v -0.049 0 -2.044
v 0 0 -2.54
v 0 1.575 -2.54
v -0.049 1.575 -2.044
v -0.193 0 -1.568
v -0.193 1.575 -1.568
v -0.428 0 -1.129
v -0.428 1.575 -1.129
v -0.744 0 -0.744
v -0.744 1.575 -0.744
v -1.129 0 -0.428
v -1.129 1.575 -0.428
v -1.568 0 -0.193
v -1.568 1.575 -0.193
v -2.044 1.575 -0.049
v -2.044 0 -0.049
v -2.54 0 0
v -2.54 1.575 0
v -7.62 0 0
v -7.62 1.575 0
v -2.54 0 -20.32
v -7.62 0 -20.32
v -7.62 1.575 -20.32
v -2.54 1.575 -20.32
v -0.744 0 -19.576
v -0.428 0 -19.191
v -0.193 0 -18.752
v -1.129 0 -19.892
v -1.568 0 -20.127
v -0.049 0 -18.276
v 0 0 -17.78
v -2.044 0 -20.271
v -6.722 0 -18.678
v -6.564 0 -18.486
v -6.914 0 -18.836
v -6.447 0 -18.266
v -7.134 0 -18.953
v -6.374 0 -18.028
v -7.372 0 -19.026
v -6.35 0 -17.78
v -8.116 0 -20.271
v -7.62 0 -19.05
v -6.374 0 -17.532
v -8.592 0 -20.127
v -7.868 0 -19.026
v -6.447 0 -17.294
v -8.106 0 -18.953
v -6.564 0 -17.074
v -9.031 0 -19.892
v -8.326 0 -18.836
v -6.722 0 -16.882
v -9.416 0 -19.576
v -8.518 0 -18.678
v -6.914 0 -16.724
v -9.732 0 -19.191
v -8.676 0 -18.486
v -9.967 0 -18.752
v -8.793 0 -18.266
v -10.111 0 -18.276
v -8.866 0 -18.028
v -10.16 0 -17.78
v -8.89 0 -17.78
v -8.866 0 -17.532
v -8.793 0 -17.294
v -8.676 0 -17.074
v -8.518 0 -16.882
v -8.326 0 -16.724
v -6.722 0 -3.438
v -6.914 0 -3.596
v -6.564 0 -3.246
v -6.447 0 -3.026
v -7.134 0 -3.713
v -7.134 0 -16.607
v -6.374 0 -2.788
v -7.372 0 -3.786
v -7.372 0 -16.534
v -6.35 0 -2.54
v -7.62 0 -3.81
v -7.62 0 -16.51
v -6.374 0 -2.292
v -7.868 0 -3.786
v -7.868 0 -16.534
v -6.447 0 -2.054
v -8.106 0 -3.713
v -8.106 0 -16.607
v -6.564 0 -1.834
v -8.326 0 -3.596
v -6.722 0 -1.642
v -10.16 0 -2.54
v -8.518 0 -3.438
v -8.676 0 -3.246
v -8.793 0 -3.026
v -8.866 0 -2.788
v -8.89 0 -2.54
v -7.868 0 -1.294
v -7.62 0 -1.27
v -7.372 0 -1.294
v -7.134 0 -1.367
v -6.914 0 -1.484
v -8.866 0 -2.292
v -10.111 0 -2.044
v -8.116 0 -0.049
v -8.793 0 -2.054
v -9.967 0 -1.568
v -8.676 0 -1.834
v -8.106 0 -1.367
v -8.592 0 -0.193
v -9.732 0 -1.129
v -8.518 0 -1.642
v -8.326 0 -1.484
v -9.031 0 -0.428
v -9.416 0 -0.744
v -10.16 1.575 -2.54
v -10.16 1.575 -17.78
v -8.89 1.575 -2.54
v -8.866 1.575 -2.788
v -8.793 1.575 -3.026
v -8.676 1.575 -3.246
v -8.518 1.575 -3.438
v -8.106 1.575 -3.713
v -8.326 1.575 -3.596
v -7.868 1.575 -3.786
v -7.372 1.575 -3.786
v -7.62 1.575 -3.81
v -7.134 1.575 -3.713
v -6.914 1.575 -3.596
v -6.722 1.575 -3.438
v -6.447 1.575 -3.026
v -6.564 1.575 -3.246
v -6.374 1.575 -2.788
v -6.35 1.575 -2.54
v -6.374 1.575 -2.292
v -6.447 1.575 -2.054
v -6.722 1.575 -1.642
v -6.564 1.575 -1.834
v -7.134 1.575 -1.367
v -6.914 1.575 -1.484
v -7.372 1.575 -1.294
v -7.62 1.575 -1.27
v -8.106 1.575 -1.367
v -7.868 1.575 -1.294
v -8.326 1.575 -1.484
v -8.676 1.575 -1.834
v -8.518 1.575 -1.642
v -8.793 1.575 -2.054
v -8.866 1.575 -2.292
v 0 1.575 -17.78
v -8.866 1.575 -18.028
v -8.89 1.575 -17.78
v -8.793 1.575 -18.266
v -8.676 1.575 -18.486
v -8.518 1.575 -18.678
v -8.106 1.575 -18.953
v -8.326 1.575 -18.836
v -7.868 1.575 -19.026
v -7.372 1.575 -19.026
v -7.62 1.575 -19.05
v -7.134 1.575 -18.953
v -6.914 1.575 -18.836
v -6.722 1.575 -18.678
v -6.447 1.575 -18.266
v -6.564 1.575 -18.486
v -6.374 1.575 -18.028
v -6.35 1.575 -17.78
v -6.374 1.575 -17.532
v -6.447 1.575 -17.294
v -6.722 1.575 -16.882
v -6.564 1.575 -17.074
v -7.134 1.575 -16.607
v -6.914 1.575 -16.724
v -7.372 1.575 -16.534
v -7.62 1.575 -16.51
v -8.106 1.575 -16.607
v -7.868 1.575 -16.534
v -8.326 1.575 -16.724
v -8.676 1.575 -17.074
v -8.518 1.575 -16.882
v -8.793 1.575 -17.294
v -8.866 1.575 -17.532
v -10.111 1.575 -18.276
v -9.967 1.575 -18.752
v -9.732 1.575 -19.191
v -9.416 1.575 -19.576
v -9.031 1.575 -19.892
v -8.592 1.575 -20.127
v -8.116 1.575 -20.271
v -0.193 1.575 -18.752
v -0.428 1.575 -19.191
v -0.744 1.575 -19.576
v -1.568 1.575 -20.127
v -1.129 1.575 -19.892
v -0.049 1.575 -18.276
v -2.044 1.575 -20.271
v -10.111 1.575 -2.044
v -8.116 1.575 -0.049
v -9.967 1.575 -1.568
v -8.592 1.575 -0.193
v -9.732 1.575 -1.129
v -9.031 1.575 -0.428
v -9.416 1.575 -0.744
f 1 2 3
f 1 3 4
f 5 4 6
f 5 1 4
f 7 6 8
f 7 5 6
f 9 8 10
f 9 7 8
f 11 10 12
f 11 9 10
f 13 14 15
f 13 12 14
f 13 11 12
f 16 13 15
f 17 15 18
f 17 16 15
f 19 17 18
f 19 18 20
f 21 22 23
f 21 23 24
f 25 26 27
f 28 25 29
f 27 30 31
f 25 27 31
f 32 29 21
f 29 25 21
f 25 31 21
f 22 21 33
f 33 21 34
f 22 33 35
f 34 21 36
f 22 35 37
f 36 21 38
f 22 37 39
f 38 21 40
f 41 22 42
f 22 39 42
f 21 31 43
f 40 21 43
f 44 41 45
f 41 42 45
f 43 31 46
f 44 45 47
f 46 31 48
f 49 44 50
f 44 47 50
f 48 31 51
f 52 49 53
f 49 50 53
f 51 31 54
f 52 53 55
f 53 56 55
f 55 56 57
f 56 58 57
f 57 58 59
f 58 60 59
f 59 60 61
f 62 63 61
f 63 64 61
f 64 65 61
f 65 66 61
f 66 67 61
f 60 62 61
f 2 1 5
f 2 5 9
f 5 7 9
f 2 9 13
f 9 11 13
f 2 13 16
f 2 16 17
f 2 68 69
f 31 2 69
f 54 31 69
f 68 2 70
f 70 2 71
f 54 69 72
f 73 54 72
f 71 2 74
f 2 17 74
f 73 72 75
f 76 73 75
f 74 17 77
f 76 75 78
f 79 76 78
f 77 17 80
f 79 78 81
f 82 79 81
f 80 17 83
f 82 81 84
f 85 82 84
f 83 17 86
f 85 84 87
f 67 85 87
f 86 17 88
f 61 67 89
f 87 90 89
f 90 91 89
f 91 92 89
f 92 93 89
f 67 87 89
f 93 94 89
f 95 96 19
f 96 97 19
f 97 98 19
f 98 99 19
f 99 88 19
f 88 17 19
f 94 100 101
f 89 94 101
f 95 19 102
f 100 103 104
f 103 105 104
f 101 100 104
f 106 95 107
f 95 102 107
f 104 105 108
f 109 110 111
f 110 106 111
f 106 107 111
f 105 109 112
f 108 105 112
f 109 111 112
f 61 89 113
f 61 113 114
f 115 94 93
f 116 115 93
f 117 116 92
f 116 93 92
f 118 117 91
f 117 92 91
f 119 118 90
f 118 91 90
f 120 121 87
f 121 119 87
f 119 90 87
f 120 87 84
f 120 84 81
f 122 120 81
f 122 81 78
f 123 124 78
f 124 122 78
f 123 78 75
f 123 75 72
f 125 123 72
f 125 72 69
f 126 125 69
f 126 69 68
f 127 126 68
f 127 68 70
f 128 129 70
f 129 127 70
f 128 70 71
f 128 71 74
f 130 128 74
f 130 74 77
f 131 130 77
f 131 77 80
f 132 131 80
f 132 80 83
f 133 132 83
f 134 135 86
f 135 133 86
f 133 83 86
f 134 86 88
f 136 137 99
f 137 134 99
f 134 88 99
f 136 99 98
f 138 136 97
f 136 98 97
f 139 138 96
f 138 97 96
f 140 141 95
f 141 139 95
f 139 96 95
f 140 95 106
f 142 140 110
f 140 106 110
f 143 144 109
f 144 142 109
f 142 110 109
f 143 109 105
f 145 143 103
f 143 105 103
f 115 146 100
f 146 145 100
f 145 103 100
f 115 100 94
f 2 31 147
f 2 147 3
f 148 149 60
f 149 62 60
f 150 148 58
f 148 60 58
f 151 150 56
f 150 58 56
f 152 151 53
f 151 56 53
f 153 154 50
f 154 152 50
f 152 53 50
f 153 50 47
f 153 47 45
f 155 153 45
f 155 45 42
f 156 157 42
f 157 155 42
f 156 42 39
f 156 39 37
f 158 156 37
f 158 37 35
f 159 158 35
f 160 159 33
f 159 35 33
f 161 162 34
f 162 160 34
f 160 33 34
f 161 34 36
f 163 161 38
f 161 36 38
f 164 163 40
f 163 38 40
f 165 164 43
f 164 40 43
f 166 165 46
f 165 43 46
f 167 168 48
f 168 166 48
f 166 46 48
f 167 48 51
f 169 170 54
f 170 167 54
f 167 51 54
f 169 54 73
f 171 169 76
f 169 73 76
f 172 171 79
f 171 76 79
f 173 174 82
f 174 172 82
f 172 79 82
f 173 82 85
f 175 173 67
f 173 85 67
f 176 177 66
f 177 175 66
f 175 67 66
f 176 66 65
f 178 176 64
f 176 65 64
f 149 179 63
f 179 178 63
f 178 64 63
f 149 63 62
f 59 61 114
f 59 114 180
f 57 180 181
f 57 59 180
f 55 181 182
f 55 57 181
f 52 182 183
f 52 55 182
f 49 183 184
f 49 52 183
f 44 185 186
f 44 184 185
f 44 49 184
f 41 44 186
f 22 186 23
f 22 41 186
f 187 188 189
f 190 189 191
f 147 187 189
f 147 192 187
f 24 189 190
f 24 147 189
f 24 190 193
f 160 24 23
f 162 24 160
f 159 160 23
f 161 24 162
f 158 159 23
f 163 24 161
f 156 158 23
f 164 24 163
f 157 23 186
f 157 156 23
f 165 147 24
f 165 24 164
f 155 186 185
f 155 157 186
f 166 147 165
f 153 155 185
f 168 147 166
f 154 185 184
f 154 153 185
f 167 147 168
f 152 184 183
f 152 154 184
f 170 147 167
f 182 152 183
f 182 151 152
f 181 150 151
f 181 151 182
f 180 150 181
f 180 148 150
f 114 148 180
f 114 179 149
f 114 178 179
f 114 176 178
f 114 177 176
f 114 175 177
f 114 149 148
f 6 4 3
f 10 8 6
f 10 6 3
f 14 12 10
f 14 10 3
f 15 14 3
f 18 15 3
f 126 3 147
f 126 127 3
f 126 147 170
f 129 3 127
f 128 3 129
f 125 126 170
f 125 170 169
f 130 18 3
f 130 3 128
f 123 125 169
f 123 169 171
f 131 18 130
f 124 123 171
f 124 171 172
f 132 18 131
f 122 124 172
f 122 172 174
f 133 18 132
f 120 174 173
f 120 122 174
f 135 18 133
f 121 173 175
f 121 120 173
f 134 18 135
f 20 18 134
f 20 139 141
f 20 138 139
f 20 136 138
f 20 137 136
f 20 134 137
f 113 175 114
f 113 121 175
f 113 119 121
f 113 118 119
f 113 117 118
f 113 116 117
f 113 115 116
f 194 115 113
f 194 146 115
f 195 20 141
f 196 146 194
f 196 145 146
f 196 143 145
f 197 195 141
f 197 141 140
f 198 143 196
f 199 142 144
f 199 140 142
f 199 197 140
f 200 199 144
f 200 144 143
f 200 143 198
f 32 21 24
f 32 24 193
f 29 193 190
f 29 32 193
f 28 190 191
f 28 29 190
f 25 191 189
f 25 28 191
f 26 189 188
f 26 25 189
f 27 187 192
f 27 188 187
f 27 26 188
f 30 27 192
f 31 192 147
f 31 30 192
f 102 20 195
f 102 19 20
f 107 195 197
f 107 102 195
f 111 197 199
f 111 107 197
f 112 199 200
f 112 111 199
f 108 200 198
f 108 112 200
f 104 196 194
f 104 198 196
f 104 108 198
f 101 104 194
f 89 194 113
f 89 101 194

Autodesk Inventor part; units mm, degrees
ref_plane "YZ Plane" through (0, 0, 0) normal (1, 0, 0) x (0, 1, 0)
ref_plane "XZ Plane" through (0, 0, 0) normal (0, 1, 0) x (-1, 0, 0)
ref_plane "XY Plane" through (0, 0, 0) normal (0, 0, 1) x (1, 0, 0)
sketch "Sketch1" plane through (0, 0, 0) normal (0, 1, 0) x (-1, 0, 0)
  line L0 (2.54, 0) -> (7.62, 0)
  line L1 (10.16, -2.54) -> (10.16, -17.78)
  line L2 (7.62, -20.32) -> (2.54, -20.32)
  line L3 (0, -17.78) -> (0, -2.54)
  arc A0 (10.16, -2.54) -> (7.62, 0) centre (7.62, -2.54) ccw
  arc A1 (7.62, -20.32) -> (10.16, -17.78) centre (7.62, -17.78) ccw
  arc A2 (0, -17.78) -> (2.54, -20.32) centre (2.54, -17.78) ccw
  arc A3 (2.54, 0) -> (0, -2.54) centre (2.54, -2.54) ccw
  circle A4 centre (7.62, -2.54) radius 1.27
  circle A5 centre (7.62, -17.78) radius 1.27
  point P0 (0, 0)
  point P1 (10.16, -20.32)
  point P2 (10.16, 0)
  point P3 (0, -20.32)
  dimension "d0" = 10.16
  dimension "d1" = 20.32
  dimension "d2" = 2.54
  dimension "d3" = 2.54
  dimension "d4" = 2.54
  dimension "d5" = 2.54
  dimension "d6" = 2.54
  dimension "d7" = 2.54
  dimension "d8" = 2.54
extrude "Extrusion1" add sketch "Sketch1" along normal blind 1.5748
properties part number "USB_Board"
